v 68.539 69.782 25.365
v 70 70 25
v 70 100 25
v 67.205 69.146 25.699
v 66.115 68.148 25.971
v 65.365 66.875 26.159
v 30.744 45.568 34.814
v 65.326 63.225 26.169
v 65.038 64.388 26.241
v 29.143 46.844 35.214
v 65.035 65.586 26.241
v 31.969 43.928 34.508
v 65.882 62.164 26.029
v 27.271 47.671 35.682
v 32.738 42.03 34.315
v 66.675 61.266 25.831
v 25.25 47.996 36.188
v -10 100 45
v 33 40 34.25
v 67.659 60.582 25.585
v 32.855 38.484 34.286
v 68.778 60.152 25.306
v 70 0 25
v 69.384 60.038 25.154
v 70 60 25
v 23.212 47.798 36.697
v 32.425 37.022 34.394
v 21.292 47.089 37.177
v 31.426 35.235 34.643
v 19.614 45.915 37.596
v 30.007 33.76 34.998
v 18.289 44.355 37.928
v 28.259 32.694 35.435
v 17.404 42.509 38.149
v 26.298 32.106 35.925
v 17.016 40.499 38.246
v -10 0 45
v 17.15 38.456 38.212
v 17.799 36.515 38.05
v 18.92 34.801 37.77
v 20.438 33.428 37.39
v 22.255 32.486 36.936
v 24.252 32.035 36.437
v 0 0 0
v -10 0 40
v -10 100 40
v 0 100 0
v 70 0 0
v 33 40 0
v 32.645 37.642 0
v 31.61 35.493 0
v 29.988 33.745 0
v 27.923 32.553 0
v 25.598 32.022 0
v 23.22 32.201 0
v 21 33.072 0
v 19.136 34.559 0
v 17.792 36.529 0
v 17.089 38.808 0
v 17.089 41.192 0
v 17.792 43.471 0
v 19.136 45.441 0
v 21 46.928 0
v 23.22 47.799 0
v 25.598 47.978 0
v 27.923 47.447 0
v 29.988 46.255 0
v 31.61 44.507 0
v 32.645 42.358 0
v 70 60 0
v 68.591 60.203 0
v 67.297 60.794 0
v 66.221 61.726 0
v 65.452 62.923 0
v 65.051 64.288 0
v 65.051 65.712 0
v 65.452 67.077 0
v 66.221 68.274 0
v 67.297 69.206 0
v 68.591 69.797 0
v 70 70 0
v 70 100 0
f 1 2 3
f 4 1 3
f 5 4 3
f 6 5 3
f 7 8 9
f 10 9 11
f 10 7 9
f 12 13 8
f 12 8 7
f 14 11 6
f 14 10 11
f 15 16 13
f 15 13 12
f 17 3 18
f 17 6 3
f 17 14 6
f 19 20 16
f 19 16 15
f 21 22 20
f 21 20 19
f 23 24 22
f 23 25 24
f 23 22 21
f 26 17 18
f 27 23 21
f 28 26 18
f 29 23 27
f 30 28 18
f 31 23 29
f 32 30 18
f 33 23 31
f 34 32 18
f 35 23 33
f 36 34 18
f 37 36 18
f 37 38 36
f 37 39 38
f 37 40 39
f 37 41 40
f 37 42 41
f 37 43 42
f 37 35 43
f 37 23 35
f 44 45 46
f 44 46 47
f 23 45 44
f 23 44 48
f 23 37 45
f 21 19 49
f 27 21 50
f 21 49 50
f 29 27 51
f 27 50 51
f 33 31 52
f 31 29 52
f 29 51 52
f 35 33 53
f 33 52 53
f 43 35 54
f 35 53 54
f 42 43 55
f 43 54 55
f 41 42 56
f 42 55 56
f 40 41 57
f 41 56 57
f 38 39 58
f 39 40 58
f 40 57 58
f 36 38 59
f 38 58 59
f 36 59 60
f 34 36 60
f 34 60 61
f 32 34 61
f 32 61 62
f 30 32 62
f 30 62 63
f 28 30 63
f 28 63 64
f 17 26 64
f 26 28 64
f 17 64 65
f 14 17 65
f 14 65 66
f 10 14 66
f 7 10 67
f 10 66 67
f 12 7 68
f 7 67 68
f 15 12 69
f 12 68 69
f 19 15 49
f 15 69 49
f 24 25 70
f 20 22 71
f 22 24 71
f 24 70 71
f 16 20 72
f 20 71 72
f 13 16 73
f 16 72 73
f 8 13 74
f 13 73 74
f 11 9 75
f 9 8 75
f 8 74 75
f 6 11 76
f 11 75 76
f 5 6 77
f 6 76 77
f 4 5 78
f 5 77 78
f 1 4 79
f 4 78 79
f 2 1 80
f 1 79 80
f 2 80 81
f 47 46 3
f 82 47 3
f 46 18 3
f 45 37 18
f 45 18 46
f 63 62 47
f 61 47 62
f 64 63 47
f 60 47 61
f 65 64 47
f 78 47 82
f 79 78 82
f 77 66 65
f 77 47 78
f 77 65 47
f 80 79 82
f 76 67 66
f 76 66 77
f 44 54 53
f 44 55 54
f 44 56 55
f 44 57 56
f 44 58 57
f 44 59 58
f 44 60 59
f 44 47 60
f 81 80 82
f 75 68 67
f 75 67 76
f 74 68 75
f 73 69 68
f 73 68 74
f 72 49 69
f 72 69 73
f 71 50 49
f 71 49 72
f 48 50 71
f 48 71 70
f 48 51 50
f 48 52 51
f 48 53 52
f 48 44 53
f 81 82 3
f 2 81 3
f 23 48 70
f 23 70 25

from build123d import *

# Parameters (mm, degrees)
F1_DEPTH = 100
F2_R     = 8
F3_DEPTH = 45.001
F4_R     = 5
F5_DEPTH = 45.001


with BuildPart() as f1:
    # F0 (on Front) → F1 (new body)
    with BuildSketch(Plane.XZ):
        Polygon((-10, 40), (0, 0), (70, 0), (70, 25), (-10, 45), align=None)
    extrude(amount=-F1_DEPTH)

    # F2 (on face) → F3 (cut, through all)
    with BuildSketch(Plane(origin=(0, 0, 0), x_dir=(1, 0, 0), z_dir=(0, 0, -1))):
        with Locations((25, -40)):
            Circle(F2_R)
    extrude(amount=-F3_DEPTH, mode=Mode.SUBTRACT)

    # F4 (on face) → F5 (cut, through all)
    with BuildSketch(Plane(origin=(0, 0, 0), x_dir=(1, 0, 0), z_dir=(0, 0, -1))):
        with Locations((70, -65)):
            Circle(F4_R)
    extrude(amount=-F5_DEPTH, mode=Mode.SUBTRACT)


solid = f1.part
